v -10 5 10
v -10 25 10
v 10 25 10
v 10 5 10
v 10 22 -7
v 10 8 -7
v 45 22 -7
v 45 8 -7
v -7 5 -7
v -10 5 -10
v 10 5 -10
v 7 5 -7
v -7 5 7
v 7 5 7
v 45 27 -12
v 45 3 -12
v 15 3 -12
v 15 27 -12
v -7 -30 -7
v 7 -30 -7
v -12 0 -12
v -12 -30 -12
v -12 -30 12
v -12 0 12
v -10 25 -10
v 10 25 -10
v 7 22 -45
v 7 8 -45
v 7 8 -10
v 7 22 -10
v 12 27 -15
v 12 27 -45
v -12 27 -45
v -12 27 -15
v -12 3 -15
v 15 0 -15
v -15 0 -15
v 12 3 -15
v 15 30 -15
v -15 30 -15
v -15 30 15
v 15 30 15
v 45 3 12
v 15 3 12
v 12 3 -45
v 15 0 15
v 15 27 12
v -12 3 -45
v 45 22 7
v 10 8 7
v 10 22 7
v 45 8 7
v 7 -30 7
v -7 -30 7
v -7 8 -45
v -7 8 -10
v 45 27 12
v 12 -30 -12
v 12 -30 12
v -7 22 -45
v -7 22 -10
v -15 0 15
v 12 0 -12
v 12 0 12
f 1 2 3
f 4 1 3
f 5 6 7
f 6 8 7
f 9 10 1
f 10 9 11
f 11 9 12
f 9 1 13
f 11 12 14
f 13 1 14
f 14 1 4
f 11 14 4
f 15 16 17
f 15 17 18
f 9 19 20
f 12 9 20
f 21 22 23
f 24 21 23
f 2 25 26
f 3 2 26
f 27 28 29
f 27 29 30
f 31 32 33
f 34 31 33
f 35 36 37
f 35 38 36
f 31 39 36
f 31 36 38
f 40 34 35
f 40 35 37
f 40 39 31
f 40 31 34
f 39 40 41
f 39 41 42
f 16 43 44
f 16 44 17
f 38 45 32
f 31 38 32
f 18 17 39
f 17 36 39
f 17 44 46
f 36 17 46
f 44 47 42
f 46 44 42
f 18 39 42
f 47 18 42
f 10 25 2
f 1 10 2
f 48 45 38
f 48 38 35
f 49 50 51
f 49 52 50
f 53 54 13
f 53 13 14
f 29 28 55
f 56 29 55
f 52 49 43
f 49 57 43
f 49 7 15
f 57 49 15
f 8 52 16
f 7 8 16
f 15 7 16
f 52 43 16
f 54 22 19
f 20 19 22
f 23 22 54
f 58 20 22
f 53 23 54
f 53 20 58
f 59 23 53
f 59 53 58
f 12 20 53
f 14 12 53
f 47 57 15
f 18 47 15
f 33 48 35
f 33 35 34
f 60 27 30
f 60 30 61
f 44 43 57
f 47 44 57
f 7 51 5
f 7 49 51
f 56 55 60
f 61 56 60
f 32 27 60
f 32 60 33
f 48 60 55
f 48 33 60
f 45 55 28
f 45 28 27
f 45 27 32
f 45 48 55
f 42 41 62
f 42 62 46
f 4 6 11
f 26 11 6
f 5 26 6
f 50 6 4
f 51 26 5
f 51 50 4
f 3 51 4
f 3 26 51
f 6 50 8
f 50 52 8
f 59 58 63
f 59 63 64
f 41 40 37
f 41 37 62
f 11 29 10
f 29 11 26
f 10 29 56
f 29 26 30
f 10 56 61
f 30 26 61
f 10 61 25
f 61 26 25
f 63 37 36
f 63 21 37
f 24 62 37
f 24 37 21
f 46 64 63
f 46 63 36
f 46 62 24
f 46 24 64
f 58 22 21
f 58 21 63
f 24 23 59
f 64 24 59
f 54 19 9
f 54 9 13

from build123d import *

# Parameters (mm, degrees)
CROQUIS1_W     = 30
CROQUIS1_H     = 30
EXTRUIR1_DEPTH = 30
CROQUIS5_W     = 30
CROQUIS5_H     = 30
EXTRUIR4_DEPTH = 30
CROQUIS2_W     = 30
CROQUIS2_H     = 30
CROQUIS2_W_2   = 24
CROQUIS2_H_2   = 24
EXTRUIR2_DEPTH = 30
CROQUIS3_W     = 30
CROQUIS3_H     = 30
CROQUIS3_W_2   = 24
CROQUIS3_H_2   = 24
EXTRUIR3_DEPTH = 30
CROQUIS7_W     = 30
CROQUIS7_H     = 30
CROQUIS7_W_2   = 24
CROQUIS7_H_2   = 24
EXTRUIR5_DEPTH = 30
VACIADO1_T     = -5


with BuildPart() as part:
    # Croquis1 → Extruir1 (new body)
    with BuildSketch(Plane(origin=(0, 0, 0), x_dir=(1, 0, 0), z_dir=(0, 1, 0))):
        with Locations((0, 30)):
            Rectangle(CROQUIS1_W, CROQUIS1_H)
        Rectangle(CROQUIS1_W, CROQUIS1_H)
        with Locations((30, 0)):
            Rectangle(CROQUIS1_W, CROQUIS1_H)
    extrude(amount=EXTRUIR1_DEPTH)

    # Croquis5 → Extruir4 (add)
    with BuildSketch(Plane.XZ):
        Rectangle(CROQUIS5_W, CROQUIS5_H)
    extrude(amount=EXTRUIR4_DEPTH)

    # Croquis2 → Extruir2 (cut)
    with BuildSketch(Plane(origin=(45, 0, 0), x_dir=(0, 0, -1), z_dir=(1, 0, 0))):
        with Locations((0, 15)):
            Rectangle(CROQUIS2_W, CROQUIS2_H)
        with Locations((0, 15)):
            Rectangle(CROQUIS2_W_2, CROQUIS2_H_2, mode=Mode.SUBTRACT)
    extrude(amount=-EXTRUIR2_DEPTH, mode=Mode.SUBTRACT)

    # Croquis3 → Extruir3 (cut)
    with BuildSketch(Plane(origin=(0, 0, -45), x_dir=(-1, 0, 0), z_dir=(0, 0, -1))):
        with Locations((0, 15)):
            Rectangle(CROQUIS3_W, CROQUIS3_H)
        with Locations((0, 15)):
            Rectangle(CROQUIS3_W_2, CROQUIS3_H_2, mode=Mode.SUBTRACT)
    extrude(amount=-EXTRUIR3_DEPTH, mode=Mode.SUBTRACT)

    # Croquis7 → Extruir5 (cut)
    with BuildSketch(Plane.XZ.offset(30)):
        Rectangle(CROQUIS7_W, CROQUIS7_H)
        Rectangle(CROQUIS7_W_2, CROQUIS7_H_2, mode=Mode.SUBTRACT)
    extrude(amount=-EXTRUIR5_DEPTH, mode=Mode.SUBTRACT)

    # Vaciado1
    vaciado1_openings = [part.faces().sort_by_distance(p)[0] for p in [
        (45, 15, 0),
        (0, 15, -45),
        (0, -30, 0),
    ]]
    offset(amount=VACIADO1_T, openings=vaciado1_openings, kind=Kind.INTERSECTION)


solid = part.part
